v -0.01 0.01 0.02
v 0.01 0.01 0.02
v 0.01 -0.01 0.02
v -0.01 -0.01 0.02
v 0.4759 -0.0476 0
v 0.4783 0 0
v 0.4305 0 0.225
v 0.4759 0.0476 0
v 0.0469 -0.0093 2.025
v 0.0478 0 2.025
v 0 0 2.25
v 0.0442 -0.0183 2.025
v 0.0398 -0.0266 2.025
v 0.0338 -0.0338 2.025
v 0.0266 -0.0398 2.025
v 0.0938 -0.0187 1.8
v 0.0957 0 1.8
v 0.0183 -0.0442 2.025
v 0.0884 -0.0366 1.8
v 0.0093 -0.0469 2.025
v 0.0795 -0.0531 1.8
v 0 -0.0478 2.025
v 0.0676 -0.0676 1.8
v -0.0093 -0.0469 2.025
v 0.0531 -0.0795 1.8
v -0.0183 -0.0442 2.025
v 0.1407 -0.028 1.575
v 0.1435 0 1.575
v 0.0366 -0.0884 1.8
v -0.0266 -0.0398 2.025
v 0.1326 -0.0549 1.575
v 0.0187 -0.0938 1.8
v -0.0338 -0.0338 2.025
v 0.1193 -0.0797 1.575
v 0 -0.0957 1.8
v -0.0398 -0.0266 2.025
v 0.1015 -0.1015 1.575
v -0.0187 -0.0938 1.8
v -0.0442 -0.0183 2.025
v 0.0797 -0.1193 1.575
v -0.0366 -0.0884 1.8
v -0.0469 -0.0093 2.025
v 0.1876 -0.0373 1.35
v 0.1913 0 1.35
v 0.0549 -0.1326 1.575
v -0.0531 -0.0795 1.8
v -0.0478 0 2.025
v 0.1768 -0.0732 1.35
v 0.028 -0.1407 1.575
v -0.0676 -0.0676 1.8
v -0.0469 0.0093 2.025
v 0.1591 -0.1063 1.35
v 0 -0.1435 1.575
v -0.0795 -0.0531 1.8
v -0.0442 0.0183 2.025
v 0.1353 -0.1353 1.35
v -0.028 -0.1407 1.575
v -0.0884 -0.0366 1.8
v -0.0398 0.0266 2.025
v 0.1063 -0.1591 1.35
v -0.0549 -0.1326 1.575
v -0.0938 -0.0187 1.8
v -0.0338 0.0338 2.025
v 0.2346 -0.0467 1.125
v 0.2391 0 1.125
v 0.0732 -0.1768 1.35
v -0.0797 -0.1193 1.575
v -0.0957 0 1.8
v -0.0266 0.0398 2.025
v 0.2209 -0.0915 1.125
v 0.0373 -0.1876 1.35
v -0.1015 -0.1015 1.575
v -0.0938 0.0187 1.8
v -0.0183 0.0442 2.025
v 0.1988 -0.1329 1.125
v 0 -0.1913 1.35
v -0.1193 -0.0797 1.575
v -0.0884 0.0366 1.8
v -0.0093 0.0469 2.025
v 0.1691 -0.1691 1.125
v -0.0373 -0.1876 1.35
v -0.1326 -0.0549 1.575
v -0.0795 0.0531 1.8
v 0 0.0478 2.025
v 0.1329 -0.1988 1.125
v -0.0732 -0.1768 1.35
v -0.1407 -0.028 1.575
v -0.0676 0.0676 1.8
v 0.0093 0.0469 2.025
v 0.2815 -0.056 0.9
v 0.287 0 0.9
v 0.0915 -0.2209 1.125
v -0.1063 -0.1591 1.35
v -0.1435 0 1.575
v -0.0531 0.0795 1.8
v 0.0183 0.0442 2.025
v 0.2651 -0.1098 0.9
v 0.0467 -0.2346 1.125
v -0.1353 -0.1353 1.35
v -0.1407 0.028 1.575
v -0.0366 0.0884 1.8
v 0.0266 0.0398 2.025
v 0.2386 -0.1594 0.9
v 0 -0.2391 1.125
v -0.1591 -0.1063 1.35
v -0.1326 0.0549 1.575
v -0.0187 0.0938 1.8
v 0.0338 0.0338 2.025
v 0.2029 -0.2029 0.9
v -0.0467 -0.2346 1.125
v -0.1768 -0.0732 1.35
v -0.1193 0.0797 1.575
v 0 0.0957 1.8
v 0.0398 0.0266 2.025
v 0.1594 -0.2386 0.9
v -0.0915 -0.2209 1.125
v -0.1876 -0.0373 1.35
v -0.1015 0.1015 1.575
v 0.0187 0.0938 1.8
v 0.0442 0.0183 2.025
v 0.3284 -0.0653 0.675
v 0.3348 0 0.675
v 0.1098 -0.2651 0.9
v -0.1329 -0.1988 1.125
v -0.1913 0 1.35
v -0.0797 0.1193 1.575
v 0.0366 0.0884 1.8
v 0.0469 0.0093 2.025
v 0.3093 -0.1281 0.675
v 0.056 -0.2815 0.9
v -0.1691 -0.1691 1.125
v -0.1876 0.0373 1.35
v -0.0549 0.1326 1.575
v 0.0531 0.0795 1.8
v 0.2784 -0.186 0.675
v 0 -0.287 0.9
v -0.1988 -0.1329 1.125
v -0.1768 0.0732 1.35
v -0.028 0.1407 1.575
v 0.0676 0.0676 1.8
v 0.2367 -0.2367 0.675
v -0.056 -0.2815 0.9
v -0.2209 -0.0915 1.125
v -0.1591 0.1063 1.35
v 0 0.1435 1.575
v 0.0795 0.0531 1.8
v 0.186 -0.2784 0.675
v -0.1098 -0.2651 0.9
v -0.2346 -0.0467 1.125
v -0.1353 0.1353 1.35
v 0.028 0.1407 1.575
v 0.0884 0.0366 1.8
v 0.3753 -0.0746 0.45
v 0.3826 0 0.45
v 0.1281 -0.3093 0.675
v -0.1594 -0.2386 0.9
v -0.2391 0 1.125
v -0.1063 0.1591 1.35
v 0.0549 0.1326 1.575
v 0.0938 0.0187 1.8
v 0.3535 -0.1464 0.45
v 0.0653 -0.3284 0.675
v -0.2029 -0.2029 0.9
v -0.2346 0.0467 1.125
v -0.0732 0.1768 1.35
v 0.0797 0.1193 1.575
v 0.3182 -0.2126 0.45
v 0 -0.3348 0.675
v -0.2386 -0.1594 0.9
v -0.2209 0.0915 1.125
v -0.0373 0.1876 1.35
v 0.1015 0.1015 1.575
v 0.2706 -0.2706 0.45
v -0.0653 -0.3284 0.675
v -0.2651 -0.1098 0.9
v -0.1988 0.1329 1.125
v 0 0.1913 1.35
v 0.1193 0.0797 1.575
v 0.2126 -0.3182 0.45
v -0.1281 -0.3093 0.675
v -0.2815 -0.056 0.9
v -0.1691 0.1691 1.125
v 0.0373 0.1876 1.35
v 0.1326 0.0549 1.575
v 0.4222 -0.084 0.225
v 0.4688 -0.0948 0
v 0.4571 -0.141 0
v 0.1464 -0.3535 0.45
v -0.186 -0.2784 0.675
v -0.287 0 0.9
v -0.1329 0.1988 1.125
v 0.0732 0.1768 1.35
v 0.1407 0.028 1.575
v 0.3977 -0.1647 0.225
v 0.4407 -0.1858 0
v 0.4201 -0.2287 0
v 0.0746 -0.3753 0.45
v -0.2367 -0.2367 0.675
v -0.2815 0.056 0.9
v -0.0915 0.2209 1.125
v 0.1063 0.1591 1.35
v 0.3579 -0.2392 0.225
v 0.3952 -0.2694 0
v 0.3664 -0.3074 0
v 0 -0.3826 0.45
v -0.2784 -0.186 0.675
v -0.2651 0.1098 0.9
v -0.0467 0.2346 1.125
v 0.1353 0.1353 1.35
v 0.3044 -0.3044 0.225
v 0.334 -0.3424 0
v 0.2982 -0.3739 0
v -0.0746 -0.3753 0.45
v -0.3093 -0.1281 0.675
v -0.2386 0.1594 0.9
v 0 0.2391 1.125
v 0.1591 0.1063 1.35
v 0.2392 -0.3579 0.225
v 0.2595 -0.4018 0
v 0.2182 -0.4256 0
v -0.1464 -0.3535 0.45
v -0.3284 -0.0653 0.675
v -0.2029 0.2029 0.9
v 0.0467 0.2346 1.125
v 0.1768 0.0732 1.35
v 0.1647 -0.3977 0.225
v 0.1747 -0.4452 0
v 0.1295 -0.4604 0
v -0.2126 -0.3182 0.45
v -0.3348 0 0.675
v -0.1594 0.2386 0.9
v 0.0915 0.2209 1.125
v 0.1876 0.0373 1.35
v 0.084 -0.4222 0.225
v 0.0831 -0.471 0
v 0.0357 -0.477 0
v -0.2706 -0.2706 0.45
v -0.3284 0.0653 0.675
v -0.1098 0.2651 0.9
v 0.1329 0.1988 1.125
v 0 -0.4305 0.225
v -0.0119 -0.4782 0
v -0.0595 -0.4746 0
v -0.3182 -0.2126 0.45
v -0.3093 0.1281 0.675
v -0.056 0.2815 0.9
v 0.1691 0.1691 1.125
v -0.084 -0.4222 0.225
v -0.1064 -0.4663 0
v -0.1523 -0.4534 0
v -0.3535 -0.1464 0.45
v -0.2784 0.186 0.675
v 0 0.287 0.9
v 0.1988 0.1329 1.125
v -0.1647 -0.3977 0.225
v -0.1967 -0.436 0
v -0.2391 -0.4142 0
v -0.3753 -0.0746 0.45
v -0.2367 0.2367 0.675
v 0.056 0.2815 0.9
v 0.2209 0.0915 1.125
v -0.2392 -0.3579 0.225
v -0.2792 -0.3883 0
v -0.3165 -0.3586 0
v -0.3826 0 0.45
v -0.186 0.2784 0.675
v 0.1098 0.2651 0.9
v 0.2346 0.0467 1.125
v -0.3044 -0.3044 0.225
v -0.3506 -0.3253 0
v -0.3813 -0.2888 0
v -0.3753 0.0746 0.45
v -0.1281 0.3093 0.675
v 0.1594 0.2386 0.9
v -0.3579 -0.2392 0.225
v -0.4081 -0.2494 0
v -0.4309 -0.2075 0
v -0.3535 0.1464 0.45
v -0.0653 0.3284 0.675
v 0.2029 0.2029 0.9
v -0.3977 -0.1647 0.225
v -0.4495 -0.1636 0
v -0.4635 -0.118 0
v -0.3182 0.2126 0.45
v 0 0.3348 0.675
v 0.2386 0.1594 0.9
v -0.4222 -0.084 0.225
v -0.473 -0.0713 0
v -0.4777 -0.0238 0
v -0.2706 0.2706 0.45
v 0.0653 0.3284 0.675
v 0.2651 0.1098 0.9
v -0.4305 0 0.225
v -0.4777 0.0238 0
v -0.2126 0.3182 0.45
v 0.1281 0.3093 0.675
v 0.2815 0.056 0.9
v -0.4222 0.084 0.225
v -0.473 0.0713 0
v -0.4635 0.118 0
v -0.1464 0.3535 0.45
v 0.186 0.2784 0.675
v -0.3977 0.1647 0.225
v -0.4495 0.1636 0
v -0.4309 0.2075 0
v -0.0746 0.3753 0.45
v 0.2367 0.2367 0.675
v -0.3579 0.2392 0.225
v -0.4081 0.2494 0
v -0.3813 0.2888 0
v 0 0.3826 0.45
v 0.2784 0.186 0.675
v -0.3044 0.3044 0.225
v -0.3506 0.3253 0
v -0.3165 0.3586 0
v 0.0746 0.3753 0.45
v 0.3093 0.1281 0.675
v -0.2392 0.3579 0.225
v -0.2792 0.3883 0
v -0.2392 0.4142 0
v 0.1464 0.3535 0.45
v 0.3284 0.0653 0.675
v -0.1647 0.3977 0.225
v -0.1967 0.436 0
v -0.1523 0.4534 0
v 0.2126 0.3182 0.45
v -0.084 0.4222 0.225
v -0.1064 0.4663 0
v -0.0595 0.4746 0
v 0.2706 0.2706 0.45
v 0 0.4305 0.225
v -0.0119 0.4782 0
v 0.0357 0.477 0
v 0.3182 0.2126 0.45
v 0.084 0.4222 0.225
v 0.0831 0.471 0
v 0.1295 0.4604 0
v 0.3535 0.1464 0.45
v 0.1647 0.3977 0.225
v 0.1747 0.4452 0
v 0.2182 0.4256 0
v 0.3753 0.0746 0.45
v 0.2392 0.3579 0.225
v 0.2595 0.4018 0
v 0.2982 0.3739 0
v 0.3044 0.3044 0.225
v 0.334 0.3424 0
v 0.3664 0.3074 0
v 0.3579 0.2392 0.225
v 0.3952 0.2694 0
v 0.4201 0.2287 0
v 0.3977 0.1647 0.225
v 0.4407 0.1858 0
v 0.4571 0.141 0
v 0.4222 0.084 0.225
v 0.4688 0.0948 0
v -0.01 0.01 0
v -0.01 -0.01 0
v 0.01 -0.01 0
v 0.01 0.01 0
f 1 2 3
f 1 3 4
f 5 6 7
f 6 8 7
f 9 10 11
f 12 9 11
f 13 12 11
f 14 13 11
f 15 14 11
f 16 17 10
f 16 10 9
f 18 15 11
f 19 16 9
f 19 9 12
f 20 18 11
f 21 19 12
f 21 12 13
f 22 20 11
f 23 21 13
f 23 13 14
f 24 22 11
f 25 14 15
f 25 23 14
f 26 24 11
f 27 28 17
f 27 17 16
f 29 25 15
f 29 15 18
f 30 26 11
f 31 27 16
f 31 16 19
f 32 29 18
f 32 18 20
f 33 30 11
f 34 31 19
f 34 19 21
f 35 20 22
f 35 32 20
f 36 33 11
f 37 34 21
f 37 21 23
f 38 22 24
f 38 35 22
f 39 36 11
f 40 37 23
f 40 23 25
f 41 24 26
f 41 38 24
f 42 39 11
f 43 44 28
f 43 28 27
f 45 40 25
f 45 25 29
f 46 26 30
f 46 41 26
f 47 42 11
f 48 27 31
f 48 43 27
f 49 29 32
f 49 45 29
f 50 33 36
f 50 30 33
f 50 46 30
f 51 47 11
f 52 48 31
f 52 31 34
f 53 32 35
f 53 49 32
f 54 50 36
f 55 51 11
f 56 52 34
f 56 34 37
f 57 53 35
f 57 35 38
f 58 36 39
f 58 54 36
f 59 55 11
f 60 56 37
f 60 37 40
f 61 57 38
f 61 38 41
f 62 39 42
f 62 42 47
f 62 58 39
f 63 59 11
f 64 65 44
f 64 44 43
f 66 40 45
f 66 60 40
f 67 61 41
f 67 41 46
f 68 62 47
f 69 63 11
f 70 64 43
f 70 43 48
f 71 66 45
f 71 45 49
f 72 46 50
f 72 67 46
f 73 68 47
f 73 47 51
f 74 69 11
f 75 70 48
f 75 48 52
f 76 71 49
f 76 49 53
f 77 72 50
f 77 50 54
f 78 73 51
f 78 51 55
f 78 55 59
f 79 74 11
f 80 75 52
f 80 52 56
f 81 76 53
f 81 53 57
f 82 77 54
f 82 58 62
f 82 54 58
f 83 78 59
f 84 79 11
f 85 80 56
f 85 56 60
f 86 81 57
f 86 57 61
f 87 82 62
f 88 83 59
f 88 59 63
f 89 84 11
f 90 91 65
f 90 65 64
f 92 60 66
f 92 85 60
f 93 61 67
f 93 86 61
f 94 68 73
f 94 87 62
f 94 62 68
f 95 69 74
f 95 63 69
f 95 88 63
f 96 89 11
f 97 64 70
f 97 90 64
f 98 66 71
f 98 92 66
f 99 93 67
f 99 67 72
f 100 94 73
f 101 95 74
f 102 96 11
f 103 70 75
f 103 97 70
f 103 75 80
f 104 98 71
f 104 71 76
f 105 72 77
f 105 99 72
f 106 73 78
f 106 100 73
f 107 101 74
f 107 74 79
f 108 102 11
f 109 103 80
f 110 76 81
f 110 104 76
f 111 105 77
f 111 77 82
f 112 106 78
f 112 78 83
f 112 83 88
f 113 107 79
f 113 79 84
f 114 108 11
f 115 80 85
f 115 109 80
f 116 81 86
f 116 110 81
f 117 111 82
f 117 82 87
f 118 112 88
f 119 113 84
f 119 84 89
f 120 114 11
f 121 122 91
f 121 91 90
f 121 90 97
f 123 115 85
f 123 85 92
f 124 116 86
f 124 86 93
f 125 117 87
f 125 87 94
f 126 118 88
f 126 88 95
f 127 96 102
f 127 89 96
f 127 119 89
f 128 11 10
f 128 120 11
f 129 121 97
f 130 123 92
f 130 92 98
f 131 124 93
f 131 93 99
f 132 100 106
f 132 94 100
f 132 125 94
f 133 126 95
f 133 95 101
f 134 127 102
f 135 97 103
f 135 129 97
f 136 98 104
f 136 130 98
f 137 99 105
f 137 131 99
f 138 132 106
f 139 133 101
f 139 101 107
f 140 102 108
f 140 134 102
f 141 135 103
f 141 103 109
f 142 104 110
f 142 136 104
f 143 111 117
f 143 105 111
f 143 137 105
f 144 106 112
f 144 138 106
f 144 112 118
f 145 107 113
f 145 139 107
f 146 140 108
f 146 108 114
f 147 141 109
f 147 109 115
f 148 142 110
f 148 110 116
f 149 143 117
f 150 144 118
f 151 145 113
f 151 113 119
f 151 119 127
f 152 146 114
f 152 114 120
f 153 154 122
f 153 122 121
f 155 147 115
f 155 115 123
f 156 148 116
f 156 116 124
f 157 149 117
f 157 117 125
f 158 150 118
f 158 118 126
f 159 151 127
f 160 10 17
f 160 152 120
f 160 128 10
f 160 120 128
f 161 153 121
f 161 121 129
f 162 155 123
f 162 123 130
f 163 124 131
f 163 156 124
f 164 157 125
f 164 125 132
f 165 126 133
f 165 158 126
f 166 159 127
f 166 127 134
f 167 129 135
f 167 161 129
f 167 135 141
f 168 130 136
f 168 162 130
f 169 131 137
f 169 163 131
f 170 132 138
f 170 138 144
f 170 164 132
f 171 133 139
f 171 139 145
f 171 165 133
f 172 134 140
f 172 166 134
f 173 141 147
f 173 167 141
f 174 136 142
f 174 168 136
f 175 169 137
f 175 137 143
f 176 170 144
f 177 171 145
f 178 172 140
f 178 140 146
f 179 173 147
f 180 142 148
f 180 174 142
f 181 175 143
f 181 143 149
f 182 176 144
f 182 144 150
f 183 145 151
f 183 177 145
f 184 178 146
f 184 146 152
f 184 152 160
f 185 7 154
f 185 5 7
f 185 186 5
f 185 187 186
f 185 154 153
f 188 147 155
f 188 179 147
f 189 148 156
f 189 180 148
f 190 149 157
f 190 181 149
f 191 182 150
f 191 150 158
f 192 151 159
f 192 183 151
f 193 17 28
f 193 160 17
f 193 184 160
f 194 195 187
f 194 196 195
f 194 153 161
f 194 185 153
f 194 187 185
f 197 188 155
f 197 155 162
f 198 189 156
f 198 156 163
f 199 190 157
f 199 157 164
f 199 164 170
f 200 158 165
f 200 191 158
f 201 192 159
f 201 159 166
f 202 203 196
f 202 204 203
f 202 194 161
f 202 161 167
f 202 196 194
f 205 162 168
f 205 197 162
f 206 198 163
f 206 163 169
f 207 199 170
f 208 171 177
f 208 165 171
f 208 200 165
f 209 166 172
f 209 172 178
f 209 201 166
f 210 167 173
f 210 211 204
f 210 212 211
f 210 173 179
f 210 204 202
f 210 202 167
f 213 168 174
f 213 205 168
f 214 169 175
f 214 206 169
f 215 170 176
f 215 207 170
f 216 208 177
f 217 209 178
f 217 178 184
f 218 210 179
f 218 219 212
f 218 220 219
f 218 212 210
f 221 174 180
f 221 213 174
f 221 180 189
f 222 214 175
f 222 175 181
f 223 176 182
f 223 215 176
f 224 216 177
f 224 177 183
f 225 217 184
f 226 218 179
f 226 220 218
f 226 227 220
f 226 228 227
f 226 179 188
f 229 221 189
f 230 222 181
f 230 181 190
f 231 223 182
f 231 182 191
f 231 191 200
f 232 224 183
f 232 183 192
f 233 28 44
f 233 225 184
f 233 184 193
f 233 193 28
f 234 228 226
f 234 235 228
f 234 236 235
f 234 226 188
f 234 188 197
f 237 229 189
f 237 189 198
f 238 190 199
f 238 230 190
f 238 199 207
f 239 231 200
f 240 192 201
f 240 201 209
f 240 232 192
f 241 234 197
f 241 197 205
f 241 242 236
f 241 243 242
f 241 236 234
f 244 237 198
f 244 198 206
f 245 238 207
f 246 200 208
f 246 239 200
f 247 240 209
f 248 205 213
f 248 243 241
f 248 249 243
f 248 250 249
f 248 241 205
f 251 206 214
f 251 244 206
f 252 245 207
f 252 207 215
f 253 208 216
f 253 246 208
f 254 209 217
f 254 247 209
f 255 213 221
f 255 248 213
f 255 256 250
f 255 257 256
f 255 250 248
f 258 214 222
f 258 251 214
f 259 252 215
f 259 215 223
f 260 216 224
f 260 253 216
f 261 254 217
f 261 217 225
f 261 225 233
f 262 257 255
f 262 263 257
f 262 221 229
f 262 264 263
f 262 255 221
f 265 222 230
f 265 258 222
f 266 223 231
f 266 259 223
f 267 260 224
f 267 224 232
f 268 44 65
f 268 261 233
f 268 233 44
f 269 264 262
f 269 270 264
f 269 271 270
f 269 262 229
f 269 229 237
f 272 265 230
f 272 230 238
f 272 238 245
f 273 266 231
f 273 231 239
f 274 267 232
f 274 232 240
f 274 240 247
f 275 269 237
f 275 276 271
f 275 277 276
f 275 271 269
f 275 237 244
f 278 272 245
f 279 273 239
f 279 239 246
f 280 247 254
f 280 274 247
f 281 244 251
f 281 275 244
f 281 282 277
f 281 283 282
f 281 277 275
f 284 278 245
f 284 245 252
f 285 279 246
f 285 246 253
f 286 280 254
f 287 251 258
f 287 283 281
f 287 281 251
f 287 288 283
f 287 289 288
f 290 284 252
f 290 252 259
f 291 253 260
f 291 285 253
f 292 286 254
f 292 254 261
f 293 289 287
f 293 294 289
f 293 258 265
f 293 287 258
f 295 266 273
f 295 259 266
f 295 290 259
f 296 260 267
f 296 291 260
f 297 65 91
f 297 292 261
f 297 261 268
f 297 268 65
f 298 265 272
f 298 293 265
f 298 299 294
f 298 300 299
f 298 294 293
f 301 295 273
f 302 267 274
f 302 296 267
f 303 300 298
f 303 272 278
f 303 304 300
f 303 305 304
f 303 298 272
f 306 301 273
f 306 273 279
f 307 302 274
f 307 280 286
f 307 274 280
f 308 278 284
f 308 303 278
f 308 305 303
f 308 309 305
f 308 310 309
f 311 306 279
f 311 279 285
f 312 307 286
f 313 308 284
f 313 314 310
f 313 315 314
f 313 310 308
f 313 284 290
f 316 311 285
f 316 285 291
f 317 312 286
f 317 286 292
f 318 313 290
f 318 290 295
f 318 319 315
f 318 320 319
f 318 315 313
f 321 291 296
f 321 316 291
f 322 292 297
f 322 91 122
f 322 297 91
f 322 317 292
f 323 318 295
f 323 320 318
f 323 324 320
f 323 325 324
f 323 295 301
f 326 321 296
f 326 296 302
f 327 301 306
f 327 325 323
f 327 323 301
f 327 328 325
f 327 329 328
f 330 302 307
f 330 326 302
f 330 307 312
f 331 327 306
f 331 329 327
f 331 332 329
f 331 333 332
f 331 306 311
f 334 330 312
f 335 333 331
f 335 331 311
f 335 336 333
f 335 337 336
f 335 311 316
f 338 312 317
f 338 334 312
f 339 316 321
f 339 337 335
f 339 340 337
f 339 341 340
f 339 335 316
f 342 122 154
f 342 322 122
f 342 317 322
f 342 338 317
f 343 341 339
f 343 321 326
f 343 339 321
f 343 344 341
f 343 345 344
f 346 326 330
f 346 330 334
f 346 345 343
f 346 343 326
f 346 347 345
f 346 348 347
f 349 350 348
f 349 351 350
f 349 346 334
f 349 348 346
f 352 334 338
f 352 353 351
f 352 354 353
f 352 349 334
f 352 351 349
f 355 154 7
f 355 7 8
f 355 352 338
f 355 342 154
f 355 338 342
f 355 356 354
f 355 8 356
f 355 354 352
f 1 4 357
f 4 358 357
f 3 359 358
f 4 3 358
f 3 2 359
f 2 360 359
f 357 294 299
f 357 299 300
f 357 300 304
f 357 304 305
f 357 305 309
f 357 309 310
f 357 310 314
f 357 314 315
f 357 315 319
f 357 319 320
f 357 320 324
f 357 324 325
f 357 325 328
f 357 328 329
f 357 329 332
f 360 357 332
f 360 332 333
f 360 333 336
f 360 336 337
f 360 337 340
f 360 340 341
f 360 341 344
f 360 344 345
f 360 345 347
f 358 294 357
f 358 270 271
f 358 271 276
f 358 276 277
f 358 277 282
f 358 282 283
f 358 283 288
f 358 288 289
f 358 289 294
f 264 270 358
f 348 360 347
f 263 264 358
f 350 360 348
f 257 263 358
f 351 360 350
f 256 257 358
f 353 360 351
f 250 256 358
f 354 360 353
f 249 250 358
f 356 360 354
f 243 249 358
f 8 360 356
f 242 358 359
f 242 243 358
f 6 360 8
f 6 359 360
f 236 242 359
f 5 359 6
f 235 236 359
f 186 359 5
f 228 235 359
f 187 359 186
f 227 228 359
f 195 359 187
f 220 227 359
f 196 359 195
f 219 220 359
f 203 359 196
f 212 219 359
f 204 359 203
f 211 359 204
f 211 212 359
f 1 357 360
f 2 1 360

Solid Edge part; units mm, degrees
sketch "Sketch1" plane through (0, 0, 0) normal (0, -1, 0) x (1, 0, 0)
  line L0 (0, 0) -> (0, 2.25)
  line L1 (0, 2.25) -> (0.4783, 0)
  line L2 (0.4783, 0) -> (0, 0)
  dimension "D1" = 2.25
revolve "RevolvedProtrusion1" add sketch "Sketch1" angle 360 about axis through (0, 0, 54) along (0, 0, -1)
sketch "Sketch2" plane through (0, 0, 0) normal (0, 0, -1) x (1, 0, 0)
  line L0 (-0.01, -0.01) -> (0.01, -0.01)
  line L1 (0.01, -0.01) -> (0.01, 0.01)
  line L2 (0.01, 0.01) -> (-0.01, 0.01)
  line L3 (-0.01, 0.01) -> (-0.01, -0.01)
  dimension "D1" = 0.02
extrude "Cutout1" cut sketch "Sketch2" against normal blind 0.02
